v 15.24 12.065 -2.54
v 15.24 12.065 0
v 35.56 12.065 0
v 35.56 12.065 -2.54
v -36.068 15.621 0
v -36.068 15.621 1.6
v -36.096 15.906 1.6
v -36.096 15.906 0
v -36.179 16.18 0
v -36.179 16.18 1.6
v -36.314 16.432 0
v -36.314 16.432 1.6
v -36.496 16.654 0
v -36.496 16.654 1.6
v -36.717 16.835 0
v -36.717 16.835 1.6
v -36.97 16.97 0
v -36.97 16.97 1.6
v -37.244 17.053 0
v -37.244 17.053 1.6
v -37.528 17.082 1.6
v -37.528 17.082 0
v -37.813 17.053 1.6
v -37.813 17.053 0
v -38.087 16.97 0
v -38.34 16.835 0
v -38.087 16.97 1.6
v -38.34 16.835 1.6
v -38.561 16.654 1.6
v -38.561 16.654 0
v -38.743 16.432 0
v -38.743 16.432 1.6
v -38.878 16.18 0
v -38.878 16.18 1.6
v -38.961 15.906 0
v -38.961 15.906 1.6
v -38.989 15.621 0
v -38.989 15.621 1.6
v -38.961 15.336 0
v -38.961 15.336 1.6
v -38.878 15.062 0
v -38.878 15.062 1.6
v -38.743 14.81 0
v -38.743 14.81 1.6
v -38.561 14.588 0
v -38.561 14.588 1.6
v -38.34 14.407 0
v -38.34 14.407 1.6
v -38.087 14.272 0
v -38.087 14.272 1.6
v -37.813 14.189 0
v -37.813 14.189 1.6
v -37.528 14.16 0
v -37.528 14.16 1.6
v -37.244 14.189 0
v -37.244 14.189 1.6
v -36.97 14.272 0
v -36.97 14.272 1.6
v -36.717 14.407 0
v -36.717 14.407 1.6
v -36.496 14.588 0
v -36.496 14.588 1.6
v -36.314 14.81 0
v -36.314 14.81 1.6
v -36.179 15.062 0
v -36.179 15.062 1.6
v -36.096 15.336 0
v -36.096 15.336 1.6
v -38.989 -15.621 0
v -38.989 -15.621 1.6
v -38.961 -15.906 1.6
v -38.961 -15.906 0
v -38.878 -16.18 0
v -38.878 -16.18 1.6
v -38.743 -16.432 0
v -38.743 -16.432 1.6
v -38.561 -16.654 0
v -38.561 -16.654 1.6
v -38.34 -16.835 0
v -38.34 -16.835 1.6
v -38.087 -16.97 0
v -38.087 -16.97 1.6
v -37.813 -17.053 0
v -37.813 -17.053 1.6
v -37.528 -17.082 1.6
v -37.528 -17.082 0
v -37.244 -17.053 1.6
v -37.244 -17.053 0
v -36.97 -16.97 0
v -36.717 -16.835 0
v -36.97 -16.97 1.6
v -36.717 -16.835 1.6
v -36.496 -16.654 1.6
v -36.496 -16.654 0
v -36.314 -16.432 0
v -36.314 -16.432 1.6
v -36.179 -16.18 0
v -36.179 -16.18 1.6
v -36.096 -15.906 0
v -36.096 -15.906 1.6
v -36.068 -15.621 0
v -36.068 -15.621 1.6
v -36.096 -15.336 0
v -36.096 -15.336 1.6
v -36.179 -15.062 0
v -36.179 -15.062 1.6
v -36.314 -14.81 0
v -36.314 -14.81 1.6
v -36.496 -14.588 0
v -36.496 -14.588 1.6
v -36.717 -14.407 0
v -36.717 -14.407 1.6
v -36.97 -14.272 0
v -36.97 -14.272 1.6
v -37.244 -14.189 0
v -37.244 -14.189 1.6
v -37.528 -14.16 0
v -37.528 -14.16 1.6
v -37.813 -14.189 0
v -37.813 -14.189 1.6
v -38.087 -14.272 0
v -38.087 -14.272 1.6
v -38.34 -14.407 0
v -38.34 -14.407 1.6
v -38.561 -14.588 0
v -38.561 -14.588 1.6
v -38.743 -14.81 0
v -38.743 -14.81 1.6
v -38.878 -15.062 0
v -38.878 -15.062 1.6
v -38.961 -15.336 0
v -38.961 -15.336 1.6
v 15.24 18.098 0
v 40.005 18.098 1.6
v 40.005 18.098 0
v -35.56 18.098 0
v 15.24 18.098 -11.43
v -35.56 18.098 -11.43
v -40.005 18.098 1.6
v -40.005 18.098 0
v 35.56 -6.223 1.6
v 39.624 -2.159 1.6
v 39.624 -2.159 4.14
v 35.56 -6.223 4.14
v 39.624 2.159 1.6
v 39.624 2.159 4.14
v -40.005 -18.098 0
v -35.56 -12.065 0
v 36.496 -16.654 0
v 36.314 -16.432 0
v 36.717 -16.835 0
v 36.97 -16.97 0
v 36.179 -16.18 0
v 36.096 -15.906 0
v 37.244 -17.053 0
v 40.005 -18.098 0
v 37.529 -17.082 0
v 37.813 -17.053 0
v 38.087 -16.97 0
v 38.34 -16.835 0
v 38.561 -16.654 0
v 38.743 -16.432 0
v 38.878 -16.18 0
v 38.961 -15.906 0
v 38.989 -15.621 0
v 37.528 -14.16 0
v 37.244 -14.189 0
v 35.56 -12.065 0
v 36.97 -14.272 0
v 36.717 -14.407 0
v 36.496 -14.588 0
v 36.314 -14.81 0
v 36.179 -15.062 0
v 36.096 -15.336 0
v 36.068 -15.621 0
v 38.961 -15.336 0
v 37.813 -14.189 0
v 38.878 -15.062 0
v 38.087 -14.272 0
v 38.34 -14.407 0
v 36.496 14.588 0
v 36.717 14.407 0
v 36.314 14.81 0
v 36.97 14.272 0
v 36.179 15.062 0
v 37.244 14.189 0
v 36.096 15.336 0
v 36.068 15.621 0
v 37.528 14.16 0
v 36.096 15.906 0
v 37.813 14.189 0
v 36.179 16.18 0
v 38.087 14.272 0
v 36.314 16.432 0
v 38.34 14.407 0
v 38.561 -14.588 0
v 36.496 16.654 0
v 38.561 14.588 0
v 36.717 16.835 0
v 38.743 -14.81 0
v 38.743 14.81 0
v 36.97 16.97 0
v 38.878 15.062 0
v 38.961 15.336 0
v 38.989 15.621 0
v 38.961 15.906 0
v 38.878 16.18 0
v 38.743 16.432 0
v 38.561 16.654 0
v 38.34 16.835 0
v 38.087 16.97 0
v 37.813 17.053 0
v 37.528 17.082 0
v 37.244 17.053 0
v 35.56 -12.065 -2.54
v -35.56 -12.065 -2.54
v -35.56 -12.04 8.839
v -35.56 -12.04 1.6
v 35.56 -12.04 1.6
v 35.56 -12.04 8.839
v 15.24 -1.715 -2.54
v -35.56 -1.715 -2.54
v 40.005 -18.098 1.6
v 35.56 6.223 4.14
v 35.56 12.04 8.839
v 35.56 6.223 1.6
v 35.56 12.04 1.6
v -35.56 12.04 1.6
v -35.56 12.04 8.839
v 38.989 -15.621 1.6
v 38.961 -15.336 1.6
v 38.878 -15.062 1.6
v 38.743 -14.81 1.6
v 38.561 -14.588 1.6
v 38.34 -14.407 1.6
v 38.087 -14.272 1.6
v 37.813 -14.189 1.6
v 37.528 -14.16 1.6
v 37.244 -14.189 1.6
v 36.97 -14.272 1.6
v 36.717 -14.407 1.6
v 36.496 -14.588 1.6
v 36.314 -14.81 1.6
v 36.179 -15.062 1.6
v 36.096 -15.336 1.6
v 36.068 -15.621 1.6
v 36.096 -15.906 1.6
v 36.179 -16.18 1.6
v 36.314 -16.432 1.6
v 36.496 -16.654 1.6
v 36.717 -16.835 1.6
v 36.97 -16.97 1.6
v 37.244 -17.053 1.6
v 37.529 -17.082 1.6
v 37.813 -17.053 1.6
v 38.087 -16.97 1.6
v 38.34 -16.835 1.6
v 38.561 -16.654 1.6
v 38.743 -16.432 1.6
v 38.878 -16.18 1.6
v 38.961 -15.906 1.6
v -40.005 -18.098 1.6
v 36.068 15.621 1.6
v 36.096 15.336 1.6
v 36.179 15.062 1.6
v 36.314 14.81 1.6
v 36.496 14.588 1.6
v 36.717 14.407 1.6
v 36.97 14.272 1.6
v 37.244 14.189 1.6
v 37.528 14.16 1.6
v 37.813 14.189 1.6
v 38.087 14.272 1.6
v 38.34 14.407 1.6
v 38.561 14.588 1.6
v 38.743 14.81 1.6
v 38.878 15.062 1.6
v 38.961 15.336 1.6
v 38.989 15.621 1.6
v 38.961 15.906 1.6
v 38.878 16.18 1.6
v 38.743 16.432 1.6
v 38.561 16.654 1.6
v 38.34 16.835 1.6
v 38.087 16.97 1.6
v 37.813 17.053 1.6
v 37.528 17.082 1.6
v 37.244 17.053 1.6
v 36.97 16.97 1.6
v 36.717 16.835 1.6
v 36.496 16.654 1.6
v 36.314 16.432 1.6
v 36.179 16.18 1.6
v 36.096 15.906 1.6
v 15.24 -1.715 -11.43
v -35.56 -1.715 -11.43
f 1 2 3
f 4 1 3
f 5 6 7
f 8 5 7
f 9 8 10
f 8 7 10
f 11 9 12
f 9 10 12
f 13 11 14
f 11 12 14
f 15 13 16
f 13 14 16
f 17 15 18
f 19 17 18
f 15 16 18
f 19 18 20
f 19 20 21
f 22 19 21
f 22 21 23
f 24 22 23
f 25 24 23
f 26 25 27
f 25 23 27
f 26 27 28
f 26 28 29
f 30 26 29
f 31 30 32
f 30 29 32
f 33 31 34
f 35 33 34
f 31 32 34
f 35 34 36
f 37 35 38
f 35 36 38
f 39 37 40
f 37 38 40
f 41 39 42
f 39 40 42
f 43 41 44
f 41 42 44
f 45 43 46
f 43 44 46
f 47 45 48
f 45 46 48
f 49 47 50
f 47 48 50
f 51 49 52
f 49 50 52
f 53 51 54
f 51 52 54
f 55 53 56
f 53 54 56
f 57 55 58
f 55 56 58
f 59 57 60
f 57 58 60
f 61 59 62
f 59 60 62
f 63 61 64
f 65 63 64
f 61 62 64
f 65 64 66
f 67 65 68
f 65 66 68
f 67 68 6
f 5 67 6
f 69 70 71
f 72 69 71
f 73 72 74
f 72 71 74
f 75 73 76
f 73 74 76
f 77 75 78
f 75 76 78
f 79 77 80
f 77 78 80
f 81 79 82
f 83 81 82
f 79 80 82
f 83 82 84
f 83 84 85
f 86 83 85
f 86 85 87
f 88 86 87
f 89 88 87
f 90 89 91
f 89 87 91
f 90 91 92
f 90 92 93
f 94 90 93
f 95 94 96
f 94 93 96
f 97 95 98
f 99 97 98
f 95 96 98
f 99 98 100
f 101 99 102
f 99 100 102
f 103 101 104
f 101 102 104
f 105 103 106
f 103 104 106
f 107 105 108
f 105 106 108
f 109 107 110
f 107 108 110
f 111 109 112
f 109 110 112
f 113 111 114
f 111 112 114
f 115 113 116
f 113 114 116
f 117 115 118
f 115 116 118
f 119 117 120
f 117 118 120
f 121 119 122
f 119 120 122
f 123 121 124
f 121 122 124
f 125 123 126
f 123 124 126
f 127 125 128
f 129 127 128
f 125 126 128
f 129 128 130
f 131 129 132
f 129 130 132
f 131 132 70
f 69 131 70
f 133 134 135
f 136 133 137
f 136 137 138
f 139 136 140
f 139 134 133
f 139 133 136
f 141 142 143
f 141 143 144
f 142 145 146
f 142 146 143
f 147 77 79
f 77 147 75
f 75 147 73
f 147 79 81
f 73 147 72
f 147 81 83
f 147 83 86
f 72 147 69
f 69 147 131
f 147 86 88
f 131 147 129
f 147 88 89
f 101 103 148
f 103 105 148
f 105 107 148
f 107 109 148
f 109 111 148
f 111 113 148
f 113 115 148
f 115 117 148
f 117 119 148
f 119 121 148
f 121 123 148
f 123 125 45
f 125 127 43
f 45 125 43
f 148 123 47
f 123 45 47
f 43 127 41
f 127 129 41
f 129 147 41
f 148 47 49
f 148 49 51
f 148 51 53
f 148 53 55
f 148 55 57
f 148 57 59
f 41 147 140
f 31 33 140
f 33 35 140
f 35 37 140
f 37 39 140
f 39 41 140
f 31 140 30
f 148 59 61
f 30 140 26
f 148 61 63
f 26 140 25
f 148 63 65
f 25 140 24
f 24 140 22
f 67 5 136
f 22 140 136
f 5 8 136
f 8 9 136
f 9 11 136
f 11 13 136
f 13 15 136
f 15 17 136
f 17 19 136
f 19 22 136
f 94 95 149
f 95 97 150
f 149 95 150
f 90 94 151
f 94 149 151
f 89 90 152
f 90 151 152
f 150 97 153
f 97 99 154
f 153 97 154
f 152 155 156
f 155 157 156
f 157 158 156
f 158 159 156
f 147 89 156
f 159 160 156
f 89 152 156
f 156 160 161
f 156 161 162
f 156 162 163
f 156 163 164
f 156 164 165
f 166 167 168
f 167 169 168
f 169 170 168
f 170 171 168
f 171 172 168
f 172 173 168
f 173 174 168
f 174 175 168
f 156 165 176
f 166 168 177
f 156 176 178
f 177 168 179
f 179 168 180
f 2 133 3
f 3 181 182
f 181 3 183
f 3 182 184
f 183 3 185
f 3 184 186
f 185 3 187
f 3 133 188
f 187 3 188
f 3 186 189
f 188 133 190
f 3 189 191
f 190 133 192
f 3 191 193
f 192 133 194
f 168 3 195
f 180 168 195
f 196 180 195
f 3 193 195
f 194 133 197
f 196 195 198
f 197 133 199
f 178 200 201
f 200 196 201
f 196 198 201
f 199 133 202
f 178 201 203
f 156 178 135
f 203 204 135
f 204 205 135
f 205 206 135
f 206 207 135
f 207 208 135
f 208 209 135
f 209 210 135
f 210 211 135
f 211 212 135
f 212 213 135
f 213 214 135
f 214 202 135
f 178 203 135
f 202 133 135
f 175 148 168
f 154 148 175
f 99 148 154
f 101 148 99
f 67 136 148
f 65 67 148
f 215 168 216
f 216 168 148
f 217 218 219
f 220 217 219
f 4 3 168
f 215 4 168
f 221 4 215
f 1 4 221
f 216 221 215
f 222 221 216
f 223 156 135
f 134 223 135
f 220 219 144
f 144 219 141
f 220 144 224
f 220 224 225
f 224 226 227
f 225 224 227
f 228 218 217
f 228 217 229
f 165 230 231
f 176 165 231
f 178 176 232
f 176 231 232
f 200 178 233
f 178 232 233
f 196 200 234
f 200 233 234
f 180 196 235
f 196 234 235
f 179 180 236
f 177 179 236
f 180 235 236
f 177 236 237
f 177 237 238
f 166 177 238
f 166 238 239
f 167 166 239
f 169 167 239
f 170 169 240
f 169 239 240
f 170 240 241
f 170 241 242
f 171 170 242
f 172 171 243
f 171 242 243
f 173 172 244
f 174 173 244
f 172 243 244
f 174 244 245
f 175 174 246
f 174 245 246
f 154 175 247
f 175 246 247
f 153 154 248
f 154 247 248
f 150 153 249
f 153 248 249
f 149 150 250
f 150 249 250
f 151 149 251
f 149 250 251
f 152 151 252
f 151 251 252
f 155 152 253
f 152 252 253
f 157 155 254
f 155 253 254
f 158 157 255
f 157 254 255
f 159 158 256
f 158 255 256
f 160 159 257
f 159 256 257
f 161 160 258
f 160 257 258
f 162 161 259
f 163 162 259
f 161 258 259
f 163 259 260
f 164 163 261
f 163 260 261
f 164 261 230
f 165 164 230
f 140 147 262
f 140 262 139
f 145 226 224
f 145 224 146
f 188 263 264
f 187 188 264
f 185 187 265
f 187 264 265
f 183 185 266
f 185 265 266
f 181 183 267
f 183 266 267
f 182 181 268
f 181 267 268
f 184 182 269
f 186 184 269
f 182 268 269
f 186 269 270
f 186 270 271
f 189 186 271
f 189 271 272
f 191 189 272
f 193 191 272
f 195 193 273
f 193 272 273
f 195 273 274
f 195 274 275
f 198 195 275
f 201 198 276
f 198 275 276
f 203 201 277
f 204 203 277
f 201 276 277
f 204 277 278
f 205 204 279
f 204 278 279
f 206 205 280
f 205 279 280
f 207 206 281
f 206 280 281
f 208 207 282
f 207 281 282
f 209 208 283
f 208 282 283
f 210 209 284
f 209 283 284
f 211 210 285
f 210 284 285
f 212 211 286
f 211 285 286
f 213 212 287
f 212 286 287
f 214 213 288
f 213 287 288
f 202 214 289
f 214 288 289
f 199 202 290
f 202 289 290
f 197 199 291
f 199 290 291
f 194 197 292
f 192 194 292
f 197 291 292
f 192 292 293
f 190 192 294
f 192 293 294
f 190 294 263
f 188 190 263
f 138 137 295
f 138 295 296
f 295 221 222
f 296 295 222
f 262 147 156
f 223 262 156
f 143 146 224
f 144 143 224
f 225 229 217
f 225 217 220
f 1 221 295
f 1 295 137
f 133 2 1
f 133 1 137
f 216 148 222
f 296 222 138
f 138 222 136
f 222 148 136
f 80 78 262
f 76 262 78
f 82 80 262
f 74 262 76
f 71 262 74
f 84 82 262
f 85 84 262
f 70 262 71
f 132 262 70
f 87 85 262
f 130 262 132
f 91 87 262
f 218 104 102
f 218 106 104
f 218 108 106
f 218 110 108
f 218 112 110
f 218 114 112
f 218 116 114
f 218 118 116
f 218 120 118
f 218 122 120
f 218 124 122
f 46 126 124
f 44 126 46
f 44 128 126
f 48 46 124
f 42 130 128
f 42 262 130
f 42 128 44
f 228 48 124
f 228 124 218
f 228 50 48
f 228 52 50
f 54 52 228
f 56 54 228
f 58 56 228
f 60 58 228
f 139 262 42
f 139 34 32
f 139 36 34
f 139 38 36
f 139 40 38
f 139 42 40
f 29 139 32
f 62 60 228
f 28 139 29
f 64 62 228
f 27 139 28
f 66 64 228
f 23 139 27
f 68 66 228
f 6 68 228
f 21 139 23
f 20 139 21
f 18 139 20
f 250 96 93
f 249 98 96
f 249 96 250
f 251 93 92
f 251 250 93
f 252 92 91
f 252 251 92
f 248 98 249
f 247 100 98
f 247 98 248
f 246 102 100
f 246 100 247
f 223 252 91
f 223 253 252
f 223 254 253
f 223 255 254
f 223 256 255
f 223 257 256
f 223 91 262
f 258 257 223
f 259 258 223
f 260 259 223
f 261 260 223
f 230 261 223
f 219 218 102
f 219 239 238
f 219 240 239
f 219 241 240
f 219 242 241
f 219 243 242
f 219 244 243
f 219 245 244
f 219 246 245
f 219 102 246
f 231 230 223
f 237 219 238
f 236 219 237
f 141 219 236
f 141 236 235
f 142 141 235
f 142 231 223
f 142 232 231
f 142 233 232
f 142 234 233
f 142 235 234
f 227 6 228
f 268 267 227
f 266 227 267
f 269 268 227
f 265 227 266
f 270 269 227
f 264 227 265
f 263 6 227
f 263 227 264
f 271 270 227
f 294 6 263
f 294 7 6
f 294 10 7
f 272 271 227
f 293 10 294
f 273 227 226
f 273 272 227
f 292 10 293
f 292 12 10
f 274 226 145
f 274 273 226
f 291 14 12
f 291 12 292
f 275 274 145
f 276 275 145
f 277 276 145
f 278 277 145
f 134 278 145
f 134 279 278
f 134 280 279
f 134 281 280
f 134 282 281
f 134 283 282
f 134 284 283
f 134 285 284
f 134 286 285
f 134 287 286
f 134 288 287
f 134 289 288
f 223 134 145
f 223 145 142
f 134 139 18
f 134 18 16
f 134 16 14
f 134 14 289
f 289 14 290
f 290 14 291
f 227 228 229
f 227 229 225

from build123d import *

# Parameters (mm, degrees)
SKETCH2_W           = 80.01
SKETCH2_H           = 36.195
BOSS_EXTRUDE1_DEPTH = 1.6002
SKETCH3_W           = 71.12
SKETCH3_H           = 24.0792
BOSS_EXTRUDE2_DEPTH = 7.239
SKETCH4_R           = 1.4605
CUT_EXTRUDE1_DEPTH  = 1.6002
BOSS_EXTRUDE3_DEPTH = 2.54
SKETCH6_W           = 50.8
SKETCH6_H           = 6.0325
SKETCH6_H_2         = 13.7795
BOSS_EXTRUDE5_DEPTH = 2.54
SKETCH9_W           = 50.8
SKETCH9_H           = 19.812
BOSS_EXTRUDE6_DEPTH = 8.89


with BuildPart() as part:
    # Sketch2 → Boss-Extrude1 (new body)
    with BuildSketch(Plane.XY):
        Rectangle(SKETCH2_W, SKETCH2_H)
    extrude(amount=BOSS_EXTRUDE1_DEPTH)

    # Sketch3 → Boss-Extrude2 (add)
    with BuildSketch(Plane.XY.offset(1.6002)):
        Rectangle(SKETCH3_W, SKETCH3_H)
    extrude(amount=BOSS_EXTRUDE2_DEPTH)

    # Sketch4 → Cut-Extrude1 (cut)
    with BuildSketch(Plane.XY.offset(1.6002)):
        with Locations((-37.5285, 15.621)):
            Circle(SKETCH4_R)
        with Locations(Location((37.5285, 15.621, 0), (0, 0, 180))):
            Circle(SKETCH4_R)
        with Locations((37.5285, -15.621)):
            Circle(SKETCH4_R)
        with Locations(Location((-37.5285, -15.621, 0), (0, 0, 180))):
            Circle(SKETCH4_R)
    extrude(amount=-CUT_EXTRUDE1_DEPTH, mode=Mode.SUBTRACT)

    # Sketch5 → Boss-Extrude3 (add)
    with BuildSketch(Plane.XY.offset(1.6002)):
        Polygon((35.56, 6.223), (39.624, 2.159), (39.624, -2.159), (35.56, -6.223), align=None)
    extrude(amount=BOSS_EXTRUDE3_DEPTH)

    # Sketch6 → Boss-Extrude5 (add)
    with BuildSketch(Plane(origin=(0, 0, 0), x_dir=(-1, 0, 0), z_dir=(0, 0, -1))):
        with Locations((10.16, 15.08125)):
            Rectangle(SKETCH6_W, SKETCH6_H)
        with Locations((10.16, 5.17525)):
            Rectangle(SKETCH6_W, SKETCH6_H_2)
        Polygon((-15.24, 12.065), (-35.56, 12.065), (-35.56, -12.065), (35.56, -12.065), (35.56, -1.7145), (-15.24, -1.7145), align=None)
    extrude(amount=BOSS_EXTRUDE5_DEPTH)

    # Sketch9 → Boss-Extrude6 (add)
    with BuildSketch(Plane(origin=(0, 0, -2.54), x_dir=(-1, 0, 0), z_dir=(0, 0, -1))):
        with Locations((10.16, 8.1915)):
            Rectangle(SKETCH9_W, SKETCH9_H)
    extrude(amount=BOSS_EXTRUDE6_DEPTH)


solid = part.part
